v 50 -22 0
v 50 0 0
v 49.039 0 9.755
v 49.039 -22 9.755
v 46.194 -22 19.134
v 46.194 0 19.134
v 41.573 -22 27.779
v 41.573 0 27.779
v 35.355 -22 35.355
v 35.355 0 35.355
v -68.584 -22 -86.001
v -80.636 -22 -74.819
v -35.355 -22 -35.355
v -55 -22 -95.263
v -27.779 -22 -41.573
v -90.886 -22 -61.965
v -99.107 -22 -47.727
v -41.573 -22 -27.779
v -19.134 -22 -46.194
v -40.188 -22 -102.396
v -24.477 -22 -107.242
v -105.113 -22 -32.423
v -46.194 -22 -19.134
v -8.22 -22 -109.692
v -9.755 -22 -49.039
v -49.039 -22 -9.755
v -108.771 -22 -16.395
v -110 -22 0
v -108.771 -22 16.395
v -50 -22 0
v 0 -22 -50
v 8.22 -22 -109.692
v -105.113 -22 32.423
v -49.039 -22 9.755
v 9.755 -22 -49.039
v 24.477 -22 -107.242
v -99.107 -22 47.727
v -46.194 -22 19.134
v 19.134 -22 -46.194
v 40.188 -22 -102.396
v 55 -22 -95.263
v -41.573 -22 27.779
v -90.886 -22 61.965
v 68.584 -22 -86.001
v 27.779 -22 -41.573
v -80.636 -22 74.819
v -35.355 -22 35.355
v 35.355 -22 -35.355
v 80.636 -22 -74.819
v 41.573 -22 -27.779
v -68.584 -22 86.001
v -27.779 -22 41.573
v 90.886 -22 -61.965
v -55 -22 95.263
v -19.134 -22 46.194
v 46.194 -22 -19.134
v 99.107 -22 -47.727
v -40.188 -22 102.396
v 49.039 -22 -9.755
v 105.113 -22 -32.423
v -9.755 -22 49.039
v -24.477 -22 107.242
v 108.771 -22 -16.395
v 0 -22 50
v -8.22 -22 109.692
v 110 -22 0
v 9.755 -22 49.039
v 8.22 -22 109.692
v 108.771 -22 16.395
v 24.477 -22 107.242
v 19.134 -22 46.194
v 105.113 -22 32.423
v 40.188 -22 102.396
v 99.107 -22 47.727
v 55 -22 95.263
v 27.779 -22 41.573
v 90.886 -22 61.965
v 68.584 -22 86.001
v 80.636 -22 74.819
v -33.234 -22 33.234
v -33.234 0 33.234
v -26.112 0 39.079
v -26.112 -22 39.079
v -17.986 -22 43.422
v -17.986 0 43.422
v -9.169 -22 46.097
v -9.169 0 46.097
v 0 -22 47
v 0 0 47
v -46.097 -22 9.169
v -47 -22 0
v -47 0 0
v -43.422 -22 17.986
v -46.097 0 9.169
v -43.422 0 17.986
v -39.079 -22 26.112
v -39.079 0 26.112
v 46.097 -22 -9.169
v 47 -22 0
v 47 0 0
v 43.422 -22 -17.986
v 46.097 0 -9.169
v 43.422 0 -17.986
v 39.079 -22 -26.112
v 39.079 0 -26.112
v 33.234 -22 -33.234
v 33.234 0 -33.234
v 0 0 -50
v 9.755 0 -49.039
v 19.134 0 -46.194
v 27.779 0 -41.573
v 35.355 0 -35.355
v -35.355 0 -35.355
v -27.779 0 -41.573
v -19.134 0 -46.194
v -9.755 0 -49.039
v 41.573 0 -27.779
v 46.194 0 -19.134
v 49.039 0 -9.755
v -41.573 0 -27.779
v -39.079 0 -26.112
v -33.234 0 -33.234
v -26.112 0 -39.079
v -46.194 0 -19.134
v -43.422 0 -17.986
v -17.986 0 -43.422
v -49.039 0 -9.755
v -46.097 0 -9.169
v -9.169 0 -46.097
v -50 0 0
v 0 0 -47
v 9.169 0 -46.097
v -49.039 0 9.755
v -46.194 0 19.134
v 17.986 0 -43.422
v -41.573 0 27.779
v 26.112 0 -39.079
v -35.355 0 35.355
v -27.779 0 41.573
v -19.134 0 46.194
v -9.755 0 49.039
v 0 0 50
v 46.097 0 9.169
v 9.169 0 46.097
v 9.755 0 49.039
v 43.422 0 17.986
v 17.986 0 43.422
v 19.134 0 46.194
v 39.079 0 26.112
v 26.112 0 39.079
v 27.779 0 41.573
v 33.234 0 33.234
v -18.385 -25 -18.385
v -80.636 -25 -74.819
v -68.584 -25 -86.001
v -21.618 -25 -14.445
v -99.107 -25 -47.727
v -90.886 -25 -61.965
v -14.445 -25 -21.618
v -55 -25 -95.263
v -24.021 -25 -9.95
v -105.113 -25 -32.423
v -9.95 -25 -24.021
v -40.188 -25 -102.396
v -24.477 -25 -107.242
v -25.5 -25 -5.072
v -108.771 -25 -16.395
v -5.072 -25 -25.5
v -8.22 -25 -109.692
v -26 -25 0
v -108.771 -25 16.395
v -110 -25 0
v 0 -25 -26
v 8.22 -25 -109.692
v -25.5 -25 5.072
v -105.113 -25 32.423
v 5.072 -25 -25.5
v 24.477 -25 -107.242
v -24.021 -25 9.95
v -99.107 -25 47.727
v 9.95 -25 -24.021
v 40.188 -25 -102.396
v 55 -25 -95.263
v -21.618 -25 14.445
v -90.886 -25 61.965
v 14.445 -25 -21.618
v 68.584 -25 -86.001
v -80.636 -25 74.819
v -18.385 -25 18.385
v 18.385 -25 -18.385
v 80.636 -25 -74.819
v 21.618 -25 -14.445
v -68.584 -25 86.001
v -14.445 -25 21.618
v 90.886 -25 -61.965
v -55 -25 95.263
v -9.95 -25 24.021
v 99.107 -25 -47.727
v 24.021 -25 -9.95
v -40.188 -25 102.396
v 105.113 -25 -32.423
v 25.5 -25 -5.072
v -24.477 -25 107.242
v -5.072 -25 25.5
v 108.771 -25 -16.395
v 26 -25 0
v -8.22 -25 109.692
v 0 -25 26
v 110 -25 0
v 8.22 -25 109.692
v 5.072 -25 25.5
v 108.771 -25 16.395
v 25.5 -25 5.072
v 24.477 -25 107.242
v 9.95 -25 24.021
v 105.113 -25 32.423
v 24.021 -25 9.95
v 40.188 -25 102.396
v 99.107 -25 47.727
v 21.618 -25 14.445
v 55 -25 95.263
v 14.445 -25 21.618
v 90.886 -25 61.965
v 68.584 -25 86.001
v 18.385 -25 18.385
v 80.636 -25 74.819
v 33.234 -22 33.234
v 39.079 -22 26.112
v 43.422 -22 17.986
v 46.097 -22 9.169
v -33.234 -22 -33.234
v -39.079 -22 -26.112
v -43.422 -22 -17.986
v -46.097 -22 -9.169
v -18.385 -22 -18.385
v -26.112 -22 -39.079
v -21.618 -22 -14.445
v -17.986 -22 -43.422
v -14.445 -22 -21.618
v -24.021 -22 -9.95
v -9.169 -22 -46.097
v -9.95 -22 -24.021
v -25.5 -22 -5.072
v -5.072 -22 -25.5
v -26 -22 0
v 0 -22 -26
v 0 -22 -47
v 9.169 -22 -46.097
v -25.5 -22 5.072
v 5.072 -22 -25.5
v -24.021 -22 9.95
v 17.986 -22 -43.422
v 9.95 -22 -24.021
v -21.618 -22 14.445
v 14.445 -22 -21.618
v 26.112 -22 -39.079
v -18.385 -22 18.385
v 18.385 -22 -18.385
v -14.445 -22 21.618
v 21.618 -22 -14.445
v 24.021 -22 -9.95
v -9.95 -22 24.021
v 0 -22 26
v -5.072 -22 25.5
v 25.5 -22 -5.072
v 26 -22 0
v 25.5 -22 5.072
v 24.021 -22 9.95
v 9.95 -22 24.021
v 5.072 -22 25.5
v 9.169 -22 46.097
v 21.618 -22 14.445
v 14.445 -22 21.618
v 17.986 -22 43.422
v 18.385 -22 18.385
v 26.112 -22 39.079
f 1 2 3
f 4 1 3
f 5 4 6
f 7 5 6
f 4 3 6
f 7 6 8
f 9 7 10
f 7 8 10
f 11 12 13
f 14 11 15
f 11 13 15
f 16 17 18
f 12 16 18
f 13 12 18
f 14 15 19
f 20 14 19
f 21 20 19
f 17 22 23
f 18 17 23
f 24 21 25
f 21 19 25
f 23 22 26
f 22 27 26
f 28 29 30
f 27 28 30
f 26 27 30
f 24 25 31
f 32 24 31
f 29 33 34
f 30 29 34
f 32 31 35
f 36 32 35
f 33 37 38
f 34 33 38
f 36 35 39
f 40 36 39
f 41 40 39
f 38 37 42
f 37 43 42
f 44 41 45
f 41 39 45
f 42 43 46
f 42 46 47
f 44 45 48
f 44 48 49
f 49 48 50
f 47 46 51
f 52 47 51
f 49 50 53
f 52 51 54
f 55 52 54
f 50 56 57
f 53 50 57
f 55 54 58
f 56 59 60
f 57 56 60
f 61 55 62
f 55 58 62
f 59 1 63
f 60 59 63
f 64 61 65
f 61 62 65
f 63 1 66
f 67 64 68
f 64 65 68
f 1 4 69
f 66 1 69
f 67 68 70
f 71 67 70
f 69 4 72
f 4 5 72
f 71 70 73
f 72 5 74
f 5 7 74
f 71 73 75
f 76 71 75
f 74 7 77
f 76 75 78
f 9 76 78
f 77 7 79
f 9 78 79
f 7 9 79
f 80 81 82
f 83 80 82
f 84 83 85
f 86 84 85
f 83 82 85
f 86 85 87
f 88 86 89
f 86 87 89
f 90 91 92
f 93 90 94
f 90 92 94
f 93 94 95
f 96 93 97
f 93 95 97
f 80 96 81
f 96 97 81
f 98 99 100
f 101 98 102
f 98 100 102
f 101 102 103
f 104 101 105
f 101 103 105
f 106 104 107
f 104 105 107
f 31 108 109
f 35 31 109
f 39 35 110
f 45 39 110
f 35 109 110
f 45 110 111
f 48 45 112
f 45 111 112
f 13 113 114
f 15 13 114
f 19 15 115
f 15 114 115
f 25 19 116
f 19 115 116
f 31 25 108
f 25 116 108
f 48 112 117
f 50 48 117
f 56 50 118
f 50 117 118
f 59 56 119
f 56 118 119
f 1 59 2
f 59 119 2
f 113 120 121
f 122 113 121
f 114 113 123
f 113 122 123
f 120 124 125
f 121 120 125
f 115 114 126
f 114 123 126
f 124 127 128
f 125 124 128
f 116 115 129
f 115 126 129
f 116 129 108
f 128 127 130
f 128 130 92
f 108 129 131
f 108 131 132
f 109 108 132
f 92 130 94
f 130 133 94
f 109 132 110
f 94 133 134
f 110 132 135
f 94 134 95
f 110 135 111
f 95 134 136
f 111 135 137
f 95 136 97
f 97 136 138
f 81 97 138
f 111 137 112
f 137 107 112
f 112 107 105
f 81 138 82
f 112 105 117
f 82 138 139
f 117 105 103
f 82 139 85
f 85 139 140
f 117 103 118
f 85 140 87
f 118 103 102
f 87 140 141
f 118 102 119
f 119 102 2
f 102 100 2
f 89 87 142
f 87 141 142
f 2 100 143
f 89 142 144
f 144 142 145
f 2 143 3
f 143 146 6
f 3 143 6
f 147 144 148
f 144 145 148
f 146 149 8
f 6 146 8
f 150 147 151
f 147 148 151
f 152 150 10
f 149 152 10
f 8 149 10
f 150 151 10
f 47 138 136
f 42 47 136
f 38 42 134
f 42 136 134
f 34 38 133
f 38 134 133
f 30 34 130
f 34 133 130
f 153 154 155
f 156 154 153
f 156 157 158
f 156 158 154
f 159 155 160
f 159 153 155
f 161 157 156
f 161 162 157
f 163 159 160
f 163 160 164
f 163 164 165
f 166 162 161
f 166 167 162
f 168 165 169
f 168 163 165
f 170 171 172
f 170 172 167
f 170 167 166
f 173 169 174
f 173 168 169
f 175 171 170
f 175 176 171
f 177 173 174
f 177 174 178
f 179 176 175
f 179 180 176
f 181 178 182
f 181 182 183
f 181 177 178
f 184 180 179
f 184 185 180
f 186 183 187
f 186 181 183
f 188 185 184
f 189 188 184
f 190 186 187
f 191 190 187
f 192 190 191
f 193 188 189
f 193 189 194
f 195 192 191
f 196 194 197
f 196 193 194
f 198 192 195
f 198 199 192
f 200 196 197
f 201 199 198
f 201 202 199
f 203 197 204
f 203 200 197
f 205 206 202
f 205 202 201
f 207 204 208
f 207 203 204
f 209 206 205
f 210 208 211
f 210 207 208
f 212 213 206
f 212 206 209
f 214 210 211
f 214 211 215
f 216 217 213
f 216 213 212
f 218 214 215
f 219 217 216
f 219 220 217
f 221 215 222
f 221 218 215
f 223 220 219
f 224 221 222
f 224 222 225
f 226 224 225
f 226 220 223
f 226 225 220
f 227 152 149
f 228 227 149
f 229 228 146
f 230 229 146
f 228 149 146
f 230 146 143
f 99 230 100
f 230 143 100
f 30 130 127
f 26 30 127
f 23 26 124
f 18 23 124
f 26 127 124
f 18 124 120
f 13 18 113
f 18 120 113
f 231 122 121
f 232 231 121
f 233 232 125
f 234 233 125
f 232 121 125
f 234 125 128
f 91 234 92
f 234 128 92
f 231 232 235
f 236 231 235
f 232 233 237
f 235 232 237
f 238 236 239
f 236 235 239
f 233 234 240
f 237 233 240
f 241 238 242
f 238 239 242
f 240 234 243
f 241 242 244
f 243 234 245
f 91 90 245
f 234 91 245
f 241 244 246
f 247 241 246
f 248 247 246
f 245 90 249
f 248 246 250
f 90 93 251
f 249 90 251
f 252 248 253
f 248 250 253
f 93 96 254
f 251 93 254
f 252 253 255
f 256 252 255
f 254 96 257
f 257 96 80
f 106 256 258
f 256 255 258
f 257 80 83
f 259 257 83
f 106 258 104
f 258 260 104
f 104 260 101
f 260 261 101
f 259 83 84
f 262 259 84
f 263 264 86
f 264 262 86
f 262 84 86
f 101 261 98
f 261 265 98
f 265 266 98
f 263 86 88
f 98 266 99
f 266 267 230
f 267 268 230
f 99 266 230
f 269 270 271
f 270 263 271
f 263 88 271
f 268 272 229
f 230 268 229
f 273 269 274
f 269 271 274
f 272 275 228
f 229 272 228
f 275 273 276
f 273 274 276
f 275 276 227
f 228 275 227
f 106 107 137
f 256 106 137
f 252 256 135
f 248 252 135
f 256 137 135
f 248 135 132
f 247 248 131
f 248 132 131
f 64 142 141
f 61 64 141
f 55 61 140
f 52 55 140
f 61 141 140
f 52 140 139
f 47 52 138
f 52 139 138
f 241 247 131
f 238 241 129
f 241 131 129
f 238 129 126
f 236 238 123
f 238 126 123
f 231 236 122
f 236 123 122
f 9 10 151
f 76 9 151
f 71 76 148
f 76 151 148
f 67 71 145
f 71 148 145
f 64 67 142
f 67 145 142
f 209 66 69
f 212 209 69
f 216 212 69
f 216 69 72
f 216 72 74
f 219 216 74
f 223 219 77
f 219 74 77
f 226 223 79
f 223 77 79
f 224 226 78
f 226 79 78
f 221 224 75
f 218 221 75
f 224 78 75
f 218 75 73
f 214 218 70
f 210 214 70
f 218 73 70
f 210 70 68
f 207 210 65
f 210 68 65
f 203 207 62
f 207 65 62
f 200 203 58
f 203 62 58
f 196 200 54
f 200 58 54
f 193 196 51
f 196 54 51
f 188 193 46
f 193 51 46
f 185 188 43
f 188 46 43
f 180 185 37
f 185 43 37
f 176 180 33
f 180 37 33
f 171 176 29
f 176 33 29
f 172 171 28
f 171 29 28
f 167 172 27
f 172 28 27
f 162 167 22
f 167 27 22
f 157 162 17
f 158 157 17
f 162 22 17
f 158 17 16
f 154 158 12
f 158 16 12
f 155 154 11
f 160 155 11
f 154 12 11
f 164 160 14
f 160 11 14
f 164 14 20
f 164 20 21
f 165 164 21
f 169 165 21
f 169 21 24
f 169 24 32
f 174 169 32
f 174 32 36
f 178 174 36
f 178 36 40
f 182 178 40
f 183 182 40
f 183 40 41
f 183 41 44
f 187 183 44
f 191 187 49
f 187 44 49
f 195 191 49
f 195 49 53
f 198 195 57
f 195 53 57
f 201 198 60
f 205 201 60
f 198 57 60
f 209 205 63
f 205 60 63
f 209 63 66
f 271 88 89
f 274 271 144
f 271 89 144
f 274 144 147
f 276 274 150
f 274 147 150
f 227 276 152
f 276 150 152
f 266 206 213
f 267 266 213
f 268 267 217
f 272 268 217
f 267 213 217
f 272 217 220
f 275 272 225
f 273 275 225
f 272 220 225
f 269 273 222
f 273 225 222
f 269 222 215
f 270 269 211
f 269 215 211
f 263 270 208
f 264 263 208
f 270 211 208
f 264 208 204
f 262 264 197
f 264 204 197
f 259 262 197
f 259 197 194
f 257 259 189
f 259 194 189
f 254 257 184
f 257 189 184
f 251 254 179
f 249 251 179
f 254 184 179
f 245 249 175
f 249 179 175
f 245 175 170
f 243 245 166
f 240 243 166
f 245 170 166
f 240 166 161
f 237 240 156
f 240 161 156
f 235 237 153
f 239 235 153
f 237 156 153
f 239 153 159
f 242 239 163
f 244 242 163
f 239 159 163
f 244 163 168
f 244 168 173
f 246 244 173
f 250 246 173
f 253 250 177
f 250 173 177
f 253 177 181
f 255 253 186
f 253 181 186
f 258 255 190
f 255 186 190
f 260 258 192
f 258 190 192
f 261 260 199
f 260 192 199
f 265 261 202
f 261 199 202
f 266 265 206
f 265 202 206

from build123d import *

# Parameters (mm, degrees)
F1_DEPTH = 22
F2_R     = 110
F2_R_2   = 50
F2_R_3   = 47
F3_DEPTH = 3
F4_R     = 26
F5_DEPTH = 3
F6_DEPTH = 25


# Not quite as in the source:
# - a feature names something its author has since deleted; it is built from what else it names


with BuildPart() as f1:
    # F0 (on Front) → F1 (new body)
    with BuildSketch(Plane.XZ):
        with BuildLine():
            Line((48.5, 0), (50, 0))
            ThreePointArc((50, 0), (46.1939766256, 19.1341716183), (35.3553390593, 35.3553390593))
            Line((35.3553390593, 35.3553390593), (34.2946788875, 34.2946788875))
            ThreePointArc((34.2946788875, 34.2946788875), (44.8081573268, 18.5601464697), (48.5, 0))
        make_face()
        with BuildLine():
            ThreePointArc((35.3553390593, -35.3553390593), (46.1939766256, -19.1341716183), (50, 0))
            Line((50, 0), (48.5, 0))
            ThreePointArc((48.5, 0), (44.8081573268, -18.5601464697), (34.2946788875, -34.2946788875))
            Line((34.2946788875, -34.2946788875), (35.3553390593, -35.3553390593))
        make_face()
        with BuildLine():
            Line((34.2946788875, 34.2946788875), (35.3553390593, 35.3553390593))
            ThreePointArc((35.3553390593, 35.3553390593), (19.1341716183, 46.1939766256), (0, 50))
            Line((0, 50), (0, 48.5))
            ThreePointArc((0, 48.5), (18.5601464697, 44.8081573268), (34.2946788875, 34.2946788875))
        make_face()
        with BuildLine():
            ThreePointArc((0, -50), (19.1341716183, -46.1939766256), (35.3553390593, -35.3553390593))
            Line((35.3553390593, -35.3553390593), (34.2946788875, -34.2946788875))
            ThreePointArc((34.2946788875, -34.2946788875), (18.5601464697, -44.8081573268), (0, -48.5))
            Line((0, -48.5), (0, -50))
        make_face()
        with BuildLine():
            Line((47, 0), (48.5, 0))
            ThreePointArc((48.5, 0), (44.8081573268, 18.5601464697), (34.2946788875, 34.2946788875))
            Line((34.2946788875, 34.2946788875), (33.2340187158, 33.2340187158))
            ThreePointArc((33.2340187158, 33.2340187158), (43.422338028, 17.9861213212), (47, 0))
        make_face()
        with BuildLine():
            ThreePointArc((34.2946788875, -34.2946788875), (44.8081573268, -18.5601464697), (48.5, 0))
            Line((48.5, 0), (47, 0))
            ThreePointArc((47, 0), (43.422338028, -17.9861213212), (33.2340187158, -33.2340187158))
            Line((33.2340187158, -33.2340187158), (34.2946788875, -34.2946788875))
        make_face()
        with BuildLine():
            Line((0, 48.5), (0, 50))
            ThreePointArc((0, 50), (-19.1341716183, 46.1939766256), (-35.3553390593, 35.3553390593))
            Line((-35.3553390593, 35.3553390593), (-34.2946788875, 34.2946788875))
            ThreePointArc((-34.2946788875, 34.2946788875), (-18.5601464697, 44.8081573268), (0, 48.5))
        make_face()
        with BuildLine():
            Line((33.2340187158, 33.2340187158), (34.2946788875, 34.2946788875))
            ThreePointArc((34.2946788875, 34.2946788875), (18.5601464697, 44.8081573268), (0, 48.5))
            Line((0, 48.5), (0, 47))
            ThreePointArc((0, 47), (17.9861213212, 43.422338028), (33.2340187158, 33.2340187158))
        make_face()
        with BuildLine():
            ThreePointArc((-35.3553390593, -35.3553390593), (-19.1341716183, -46.1939766256), (0, -50))
            Line((0, -50), (0, -48.5))
            ThreePointArc((0, -48.5), (-18.5601464697, -44.8081573268), (-34.2946788875, -34.2946788875))
            Line((-34.2946788875, -34.2946788875), (-35.3553390593, -35.3553390593))
        make_face()
        with BuildLine():
            ThreePointArc((0, -48.5), (18.5601464697, -44.8081573268), (34.2946788875, -34.2946788875))
            Line((34.2946788875, -34.2946788875), (33.2340187158, -33.2340187158))
            ThreePointArc((33.2340187158, -33.2340187158), (17.9861213212, -43.422338028), (0, -47))
            Line((0, -47), (0, -48.5))
        make_face()
        with BuildLine():
            Line((-34.2946788875, 34.2946788875), (-35.3553390593, 35.3553390593))
            ThreePointArc((-35.3553390593, 35.3553390593), (-46.1939766256, 19.1341716183), (-50, 0))
            Line((-50, 0), (-48.5, 0))
            ThreePointArc((-48.5, 0), (-44.8081573268, 18.5601464697), (-34.2946788875, 34.2946788875))
        make_face()
        with BuildLine():
            Line((0, 47), (0, 48.5))
            ThreePointArc((0, 48.5), (-18.5601464697, 44.8081573268), (-34.2946788875, 34.2946788875))
            Line((-34.2946788875, 34.2946788875), (-33.2340187158, 33.2340187158))
            ThreePointArc((-33.2340187158, 33.2340187158), (-17.9861213212, 43.422338028), (0, 47))
        make_face()
        with BuildLine():
            ThreePointArc((-50, 0), (-46.1939766256, -19.1341716183), (-35.3553390593, -35.3553390593))
            Line((-35.3553390593, -35.3553390593), (-34.2946788875, -34.2946788875))
            ThreePointArc((-34.2946788875, -34.2946788875), (-44.8081573268, -18.5601464697), (-48.5, 0))
            Line((-48.5, 0), (-50, 0))
        make_face()
        with BuildLine():
            ThreePointArc((-34.2946788875, -34.2946788875), (-18.5601464697, -44.8081573268), (0, -48.5))
            Line((0, -48.5), (0, -47))
            ThreePointArc((0, -47), (-17.9861213212, -43.422338028), (-33.2340187158, -33.2340187158))
            Line((-33.2340187158, -33.2340187158), (-34.2946788875, -34.2946788875))
        make_face()
        with BuildLine():
            Line((-33.2340187158, 33.2340187158), (-34.2946788875, 34.2946788875))
            ThreePointArc((-34.2946788875, 34.2946788875), (-44.8081573268, 18.5601464697), (-48.5, 0))
            Line((-48.5, 0), (-47, 0))
            ThreePointArc((-47, 0), (-43.422338028, 17.9861213212), (-33.2340187158, 33.2340187158))
        make_face()
        with BuildLine():
            ThreePointArc((-48.5, 0), (-44.8081573268, -18.5601464697), (-34.2946788875, -34.2946788875))
            Line((-34.2946788875, -34.2946788875), (-33.2340187158, -33.2340187158))
            ThreePointArc((-33.2340187158, -33.2340187158), (-43.422338028, -17.9861213212), (-47, 0))
            Line((-47, 0), (-48.5, 0))
        make_face()
    extrude(amount=F1_DEPTH)

    # F2 (on face) → F3 (join)
    with BuildSketch(Plane.XZ.offset(22)):
        Circle(F2_R)
        Circle(F2_R_2, mode=Mode.SUBTRACT)
        Circle(F2_R_2)
        Circle(F2_R_3, mode=Mode.SUBTRACT)
        Circle(F2_R_3)
    extrude(amount=F3_DEPTH)

    # F4 (on face) → F5 (cut, through all)
    with BuildSketch(Plane.XZ.offset(25)):
        Circle(F4_R)
    extrude(amount=-F5_DEPTH, mode=Mode.SUBTRACT)

    # F0 (on Front) → F6 (join)
    with BuildSketch(Plane.XZ):
        with BuildLine():
            Line((48.5, 0), (50, 0))
            ThreePointArc((50, 0), (46.1939766256, 19.1341716183), (35.3553390593, 35.3553390593))
            Line((35.3553390593, 35.3553390593), (34.2946788875, 34.2946788875))
            ThreePointArc((34.2946788875, 34.2946788875), (44.8081573268, 18.5601464697), (48.5, 0))
        make_face()
        with BuildLine():
            ThreePointArc((35.3553390593, -35.3553390593), (46.1939766256, -19.1341716183), (50, 0))
            Line((50, 0), (48.5, 0))
            ThreePointArc((48.5, 0), (44.8081573268, -18.5601464697), (34.2946788875, -34.2946788875))
            Line((34.2946788875, -34.2946788875), (35.3553390593, -35.3553390593))
        make_face()
        with BuildLine():
            Line((34.2946788875, 34.2946788875), (35.3553390593, 35.3553390593))
            ThreePointArc((35.3553390593, 35.3553390593), (19.1341716183, 46.1939766256), (0, 50))
            Line((0, 50), (0, 48.5))
            ThreePointArc((0, 48.5), (18.5601464697, 44.8081573268), (34.2946788875, 34.2946788875))
        make_face()
        with BuildLine():
            ThreePointArc((0, -50), (19.1341716183, -46.1939766256), (35.3553390593, -35.3553390593))
            Line((35.3553390593, -35.3553390593), (34.2946788875, -34.2946788875))
            ThreePointArc((34.2946788875, -34.2946788875), (18.5601464697, -44.8081573268), (0, -48.5))
            Line((0, -48.5), (0, -50))
        make_face()
        with BuildLine():
            Line((0, 48.5), (0, 50))
            ThreePointArc((0, 50), (-19.1341716183, 46.1939766256), (-35.3553390593, 35.3553390593))
            Line((-35.3553390593, 35.3553390593), (-34.2946788875, 34.2946788875))
            ThreePointArc((-34.2946788875, 34.2946788875), (-18.5601464697, 44.8081573268), (0, 48.5))
        make_face()
        with BuildLine():
            ThreePointArc((-35.3553390593, -35.3553390593), (-19.1341716183, -46.1939766256), (0, -50))
            Line((0, -50), (0, -48.5))
            ThreePointArc((0, -48.5), (-18.5601464697, -44.8081573268), (-34.2946788875, -34.2946788875))
            Line((-34.2946788875, -34.2946788875), (-35.3553390593, -35.3553390593))
        make_face()
        with BuildLine():
            Line((-34.2946788875, 34.2946788875), (-35.3553390593, 35.3553390593))
            ThreePointArc((-35.3553390593, 35.3553390593), (-46.1939766256, 19.1341716183), (-50, 0))
            Line((-50, 0), (-48.5, 0))
            ThreePointArc((-48.5, 0), (-44.8081573268, 18.5601464697), (-34.2946788875, 34.2946788875))
        make_face()
        with BuildLine():
            ThreePointArc((-50, 0), (-46.1939766256, -19.1341716183), (-35.3553390593, -35.3553390593))
            Line((-35.3553390593, -35.3553390593), (-34.2946788875, -34.2946788875))
            ThreePointArc((-34.2946788875, -34.2946788875), (-44.8081573268, -18.5601464697), (-48.5, 0))
            Line((-48.5, 0), (-50, 0))
        make_face()
    extrude(amount=F6_DEPTH)


solid = f1.part
